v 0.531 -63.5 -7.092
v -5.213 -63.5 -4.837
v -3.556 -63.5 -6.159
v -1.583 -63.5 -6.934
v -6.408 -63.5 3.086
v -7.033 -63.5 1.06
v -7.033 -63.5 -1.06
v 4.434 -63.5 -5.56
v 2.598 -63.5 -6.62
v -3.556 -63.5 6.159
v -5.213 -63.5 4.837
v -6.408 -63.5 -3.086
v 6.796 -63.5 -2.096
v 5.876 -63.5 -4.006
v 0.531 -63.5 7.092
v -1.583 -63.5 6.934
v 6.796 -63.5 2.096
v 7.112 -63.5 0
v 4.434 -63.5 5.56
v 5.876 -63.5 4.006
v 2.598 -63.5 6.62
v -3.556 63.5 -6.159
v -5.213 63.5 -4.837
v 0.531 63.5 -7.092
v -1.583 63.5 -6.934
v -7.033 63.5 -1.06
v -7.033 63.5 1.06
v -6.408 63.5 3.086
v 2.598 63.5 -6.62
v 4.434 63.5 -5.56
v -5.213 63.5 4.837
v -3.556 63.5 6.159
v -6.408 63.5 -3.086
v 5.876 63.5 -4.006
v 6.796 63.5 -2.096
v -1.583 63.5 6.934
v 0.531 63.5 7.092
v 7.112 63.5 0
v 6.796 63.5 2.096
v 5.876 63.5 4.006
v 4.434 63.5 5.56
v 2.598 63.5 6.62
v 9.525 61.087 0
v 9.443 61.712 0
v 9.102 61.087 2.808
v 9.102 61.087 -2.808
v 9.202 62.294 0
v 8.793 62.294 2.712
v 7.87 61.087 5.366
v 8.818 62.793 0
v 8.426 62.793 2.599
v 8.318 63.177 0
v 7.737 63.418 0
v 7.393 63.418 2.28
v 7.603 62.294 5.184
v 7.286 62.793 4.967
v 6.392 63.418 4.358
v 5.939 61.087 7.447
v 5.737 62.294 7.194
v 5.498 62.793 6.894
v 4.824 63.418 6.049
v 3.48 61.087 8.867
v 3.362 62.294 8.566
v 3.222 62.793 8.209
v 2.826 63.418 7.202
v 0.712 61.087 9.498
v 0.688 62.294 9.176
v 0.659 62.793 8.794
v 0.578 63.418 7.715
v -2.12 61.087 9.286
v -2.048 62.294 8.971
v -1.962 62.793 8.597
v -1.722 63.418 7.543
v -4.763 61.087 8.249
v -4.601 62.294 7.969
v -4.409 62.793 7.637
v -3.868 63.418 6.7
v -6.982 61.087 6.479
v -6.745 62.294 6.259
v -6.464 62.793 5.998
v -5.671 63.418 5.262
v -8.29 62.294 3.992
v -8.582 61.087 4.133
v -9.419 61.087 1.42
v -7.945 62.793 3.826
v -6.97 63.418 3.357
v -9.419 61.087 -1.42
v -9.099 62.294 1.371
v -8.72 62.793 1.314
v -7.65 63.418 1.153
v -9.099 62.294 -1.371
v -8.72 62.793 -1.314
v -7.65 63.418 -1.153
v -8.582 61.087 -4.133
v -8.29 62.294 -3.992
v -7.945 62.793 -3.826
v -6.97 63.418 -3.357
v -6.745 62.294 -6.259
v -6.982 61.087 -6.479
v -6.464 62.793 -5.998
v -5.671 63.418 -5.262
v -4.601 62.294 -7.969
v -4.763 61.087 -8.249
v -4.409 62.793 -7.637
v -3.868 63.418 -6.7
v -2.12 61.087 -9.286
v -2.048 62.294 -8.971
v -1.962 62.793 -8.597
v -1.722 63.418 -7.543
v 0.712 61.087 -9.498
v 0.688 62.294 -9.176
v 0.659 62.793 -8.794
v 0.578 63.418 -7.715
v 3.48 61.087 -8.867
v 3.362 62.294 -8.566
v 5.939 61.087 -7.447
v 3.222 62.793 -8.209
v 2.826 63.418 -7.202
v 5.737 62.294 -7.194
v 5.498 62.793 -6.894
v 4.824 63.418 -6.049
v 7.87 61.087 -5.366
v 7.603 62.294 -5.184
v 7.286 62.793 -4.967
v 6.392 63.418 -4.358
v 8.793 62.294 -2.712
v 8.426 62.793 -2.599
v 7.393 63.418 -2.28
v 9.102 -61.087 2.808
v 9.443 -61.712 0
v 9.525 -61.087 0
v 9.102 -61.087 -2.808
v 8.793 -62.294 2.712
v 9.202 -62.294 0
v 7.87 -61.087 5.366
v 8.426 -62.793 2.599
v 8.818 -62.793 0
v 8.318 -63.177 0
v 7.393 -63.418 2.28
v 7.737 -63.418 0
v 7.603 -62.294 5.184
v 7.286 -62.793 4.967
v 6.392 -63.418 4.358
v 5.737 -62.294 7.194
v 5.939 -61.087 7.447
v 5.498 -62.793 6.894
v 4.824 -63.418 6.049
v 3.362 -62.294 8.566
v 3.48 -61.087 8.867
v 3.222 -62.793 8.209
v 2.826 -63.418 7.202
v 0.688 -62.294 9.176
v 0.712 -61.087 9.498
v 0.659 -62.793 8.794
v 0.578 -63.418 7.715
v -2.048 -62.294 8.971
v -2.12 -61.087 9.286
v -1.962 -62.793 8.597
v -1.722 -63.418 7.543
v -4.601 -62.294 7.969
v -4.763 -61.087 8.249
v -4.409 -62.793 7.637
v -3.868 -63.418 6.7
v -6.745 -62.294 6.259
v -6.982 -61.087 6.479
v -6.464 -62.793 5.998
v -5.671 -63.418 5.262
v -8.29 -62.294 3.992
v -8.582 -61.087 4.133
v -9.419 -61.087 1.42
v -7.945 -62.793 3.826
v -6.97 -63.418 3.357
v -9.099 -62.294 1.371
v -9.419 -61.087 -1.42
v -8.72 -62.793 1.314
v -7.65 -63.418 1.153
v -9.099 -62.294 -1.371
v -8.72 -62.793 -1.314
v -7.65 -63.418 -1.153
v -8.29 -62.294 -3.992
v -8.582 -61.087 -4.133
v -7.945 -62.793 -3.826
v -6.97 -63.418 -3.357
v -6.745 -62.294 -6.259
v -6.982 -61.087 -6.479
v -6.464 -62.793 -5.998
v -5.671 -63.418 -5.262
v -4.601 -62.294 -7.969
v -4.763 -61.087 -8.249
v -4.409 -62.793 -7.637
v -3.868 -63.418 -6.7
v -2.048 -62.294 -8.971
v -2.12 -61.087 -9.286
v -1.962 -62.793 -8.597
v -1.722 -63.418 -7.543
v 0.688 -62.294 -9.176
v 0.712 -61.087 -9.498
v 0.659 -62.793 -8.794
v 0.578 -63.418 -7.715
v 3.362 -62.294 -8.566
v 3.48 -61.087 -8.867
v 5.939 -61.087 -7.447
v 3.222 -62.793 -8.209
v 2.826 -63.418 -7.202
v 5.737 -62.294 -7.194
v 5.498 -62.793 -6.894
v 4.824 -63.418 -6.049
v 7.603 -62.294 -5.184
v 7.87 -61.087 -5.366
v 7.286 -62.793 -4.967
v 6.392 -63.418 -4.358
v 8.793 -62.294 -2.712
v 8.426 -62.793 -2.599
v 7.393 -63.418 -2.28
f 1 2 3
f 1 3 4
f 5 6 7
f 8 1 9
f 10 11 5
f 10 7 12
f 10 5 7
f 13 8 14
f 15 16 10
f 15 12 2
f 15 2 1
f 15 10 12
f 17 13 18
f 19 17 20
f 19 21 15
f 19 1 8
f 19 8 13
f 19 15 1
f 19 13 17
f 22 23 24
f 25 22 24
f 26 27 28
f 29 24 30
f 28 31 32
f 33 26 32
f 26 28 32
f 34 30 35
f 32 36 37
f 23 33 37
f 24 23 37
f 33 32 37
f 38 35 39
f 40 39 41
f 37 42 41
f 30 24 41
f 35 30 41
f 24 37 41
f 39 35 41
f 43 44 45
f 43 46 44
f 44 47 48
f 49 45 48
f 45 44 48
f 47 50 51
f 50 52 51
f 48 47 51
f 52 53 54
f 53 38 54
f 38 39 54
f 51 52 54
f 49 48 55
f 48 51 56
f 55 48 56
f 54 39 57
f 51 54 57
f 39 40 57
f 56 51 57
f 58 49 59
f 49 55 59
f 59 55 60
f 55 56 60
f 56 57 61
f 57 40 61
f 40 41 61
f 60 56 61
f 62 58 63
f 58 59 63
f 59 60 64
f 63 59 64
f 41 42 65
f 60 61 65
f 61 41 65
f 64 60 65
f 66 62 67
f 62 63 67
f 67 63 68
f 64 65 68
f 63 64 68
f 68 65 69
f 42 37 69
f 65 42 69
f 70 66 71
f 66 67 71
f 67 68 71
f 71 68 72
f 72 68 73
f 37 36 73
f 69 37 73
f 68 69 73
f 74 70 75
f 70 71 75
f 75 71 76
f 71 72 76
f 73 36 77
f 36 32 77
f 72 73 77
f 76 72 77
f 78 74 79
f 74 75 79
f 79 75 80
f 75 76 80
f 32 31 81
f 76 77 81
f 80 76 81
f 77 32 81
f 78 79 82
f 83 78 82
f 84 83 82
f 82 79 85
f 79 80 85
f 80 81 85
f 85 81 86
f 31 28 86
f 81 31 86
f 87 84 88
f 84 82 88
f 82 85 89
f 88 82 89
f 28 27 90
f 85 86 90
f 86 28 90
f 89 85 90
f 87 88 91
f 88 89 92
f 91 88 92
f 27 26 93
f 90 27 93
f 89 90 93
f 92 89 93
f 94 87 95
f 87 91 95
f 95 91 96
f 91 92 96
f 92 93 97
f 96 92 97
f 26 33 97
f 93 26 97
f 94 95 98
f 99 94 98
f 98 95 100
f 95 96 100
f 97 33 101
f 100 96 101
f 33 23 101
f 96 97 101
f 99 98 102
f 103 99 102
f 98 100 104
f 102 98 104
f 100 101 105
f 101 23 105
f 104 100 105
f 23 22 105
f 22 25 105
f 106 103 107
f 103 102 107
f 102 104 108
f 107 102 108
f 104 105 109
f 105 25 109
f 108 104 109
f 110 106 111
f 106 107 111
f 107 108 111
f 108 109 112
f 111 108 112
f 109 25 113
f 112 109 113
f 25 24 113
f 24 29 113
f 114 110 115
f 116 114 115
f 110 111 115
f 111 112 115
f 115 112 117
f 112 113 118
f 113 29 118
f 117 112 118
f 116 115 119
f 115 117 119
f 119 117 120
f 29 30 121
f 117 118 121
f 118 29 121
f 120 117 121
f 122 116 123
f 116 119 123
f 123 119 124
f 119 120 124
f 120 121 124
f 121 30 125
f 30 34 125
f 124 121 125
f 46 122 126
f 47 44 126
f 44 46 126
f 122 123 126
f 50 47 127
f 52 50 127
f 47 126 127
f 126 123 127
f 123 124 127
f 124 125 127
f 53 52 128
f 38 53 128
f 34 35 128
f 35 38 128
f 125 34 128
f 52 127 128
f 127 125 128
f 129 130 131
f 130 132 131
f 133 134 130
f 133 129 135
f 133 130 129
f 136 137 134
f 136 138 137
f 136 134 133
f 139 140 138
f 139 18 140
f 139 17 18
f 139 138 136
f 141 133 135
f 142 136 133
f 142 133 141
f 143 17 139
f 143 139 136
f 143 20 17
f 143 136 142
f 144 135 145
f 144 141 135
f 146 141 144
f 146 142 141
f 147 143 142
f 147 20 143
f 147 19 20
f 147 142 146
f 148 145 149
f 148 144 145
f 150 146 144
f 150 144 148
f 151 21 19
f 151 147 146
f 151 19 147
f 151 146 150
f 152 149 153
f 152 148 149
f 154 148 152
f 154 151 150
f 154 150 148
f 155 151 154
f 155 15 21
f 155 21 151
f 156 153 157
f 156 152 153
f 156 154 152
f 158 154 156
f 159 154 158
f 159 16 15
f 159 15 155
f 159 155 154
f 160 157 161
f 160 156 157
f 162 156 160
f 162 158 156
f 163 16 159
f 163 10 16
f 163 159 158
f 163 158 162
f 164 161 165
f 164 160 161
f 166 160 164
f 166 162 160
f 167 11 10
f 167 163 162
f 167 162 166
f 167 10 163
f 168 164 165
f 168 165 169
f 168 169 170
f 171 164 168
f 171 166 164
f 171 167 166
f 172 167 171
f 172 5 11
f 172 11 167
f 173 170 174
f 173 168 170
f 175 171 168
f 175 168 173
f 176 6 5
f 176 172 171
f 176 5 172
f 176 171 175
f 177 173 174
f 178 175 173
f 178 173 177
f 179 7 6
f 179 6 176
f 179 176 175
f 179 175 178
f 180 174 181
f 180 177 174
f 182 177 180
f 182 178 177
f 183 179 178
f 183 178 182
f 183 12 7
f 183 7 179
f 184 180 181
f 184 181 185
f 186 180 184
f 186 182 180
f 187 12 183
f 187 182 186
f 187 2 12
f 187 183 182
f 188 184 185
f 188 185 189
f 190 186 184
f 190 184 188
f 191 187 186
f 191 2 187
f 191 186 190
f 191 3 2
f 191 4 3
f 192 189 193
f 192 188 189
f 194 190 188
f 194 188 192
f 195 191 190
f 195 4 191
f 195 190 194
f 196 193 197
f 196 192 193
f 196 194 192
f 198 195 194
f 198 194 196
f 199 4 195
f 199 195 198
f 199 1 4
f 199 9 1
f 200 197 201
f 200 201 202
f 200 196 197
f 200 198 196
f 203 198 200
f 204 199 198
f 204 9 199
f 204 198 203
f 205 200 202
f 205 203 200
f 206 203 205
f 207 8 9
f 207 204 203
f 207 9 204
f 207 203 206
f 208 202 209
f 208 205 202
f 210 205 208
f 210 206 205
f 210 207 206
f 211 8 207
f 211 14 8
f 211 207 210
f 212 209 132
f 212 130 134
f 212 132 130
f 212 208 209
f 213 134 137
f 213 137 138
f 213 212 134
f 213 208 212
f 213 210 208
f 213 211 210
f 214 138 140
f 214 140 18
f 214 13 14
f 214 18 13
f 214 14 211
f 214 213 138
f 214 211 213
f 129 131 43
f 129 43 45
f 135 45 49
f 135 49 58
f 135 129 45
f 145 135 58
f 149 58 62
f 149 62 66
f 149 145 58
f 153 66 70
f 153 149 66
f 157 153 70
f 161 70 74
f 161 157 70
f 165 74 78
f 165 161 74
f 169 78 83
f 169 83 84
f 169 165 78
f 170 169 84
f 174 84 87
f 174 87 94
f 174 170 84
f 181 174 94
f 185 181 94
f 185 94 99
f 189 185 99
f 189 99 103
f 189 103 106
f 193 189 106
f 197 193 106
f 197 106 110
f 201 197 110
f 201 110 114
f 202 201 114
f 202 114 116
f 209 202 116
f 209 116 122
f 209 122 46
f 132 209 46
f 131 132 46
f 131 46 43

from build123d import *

# Parameters (mm, degrees)
F0_R     = 9.525
F1_DEPTH = 63.5
F2_R     = 2.413
F3_R     = 2.413


with BuildPart() as f1:
    # F0 (on Front) → F1 (new body, symmetric)
    with BuildSketch(Plane.XZ):
        Circle(F0_R)
    extrude(amount=F1_DEPTH, both=True)

    # F2
    f2_edges = [f1.edges().sort_by_distance(p)[0] for p in [
        (-9.525, -63.5, 0),
    ]]
    fillet(f2_edges, radius=F2_R)

    # F3
    f3_edges = [f1.edges().sort_by_distance(p)[0] for p in [
        (-9.525, 63.5, 0),
    ]]
    fillet(f3_edges, radius=F3_R)


solid = f1.part
